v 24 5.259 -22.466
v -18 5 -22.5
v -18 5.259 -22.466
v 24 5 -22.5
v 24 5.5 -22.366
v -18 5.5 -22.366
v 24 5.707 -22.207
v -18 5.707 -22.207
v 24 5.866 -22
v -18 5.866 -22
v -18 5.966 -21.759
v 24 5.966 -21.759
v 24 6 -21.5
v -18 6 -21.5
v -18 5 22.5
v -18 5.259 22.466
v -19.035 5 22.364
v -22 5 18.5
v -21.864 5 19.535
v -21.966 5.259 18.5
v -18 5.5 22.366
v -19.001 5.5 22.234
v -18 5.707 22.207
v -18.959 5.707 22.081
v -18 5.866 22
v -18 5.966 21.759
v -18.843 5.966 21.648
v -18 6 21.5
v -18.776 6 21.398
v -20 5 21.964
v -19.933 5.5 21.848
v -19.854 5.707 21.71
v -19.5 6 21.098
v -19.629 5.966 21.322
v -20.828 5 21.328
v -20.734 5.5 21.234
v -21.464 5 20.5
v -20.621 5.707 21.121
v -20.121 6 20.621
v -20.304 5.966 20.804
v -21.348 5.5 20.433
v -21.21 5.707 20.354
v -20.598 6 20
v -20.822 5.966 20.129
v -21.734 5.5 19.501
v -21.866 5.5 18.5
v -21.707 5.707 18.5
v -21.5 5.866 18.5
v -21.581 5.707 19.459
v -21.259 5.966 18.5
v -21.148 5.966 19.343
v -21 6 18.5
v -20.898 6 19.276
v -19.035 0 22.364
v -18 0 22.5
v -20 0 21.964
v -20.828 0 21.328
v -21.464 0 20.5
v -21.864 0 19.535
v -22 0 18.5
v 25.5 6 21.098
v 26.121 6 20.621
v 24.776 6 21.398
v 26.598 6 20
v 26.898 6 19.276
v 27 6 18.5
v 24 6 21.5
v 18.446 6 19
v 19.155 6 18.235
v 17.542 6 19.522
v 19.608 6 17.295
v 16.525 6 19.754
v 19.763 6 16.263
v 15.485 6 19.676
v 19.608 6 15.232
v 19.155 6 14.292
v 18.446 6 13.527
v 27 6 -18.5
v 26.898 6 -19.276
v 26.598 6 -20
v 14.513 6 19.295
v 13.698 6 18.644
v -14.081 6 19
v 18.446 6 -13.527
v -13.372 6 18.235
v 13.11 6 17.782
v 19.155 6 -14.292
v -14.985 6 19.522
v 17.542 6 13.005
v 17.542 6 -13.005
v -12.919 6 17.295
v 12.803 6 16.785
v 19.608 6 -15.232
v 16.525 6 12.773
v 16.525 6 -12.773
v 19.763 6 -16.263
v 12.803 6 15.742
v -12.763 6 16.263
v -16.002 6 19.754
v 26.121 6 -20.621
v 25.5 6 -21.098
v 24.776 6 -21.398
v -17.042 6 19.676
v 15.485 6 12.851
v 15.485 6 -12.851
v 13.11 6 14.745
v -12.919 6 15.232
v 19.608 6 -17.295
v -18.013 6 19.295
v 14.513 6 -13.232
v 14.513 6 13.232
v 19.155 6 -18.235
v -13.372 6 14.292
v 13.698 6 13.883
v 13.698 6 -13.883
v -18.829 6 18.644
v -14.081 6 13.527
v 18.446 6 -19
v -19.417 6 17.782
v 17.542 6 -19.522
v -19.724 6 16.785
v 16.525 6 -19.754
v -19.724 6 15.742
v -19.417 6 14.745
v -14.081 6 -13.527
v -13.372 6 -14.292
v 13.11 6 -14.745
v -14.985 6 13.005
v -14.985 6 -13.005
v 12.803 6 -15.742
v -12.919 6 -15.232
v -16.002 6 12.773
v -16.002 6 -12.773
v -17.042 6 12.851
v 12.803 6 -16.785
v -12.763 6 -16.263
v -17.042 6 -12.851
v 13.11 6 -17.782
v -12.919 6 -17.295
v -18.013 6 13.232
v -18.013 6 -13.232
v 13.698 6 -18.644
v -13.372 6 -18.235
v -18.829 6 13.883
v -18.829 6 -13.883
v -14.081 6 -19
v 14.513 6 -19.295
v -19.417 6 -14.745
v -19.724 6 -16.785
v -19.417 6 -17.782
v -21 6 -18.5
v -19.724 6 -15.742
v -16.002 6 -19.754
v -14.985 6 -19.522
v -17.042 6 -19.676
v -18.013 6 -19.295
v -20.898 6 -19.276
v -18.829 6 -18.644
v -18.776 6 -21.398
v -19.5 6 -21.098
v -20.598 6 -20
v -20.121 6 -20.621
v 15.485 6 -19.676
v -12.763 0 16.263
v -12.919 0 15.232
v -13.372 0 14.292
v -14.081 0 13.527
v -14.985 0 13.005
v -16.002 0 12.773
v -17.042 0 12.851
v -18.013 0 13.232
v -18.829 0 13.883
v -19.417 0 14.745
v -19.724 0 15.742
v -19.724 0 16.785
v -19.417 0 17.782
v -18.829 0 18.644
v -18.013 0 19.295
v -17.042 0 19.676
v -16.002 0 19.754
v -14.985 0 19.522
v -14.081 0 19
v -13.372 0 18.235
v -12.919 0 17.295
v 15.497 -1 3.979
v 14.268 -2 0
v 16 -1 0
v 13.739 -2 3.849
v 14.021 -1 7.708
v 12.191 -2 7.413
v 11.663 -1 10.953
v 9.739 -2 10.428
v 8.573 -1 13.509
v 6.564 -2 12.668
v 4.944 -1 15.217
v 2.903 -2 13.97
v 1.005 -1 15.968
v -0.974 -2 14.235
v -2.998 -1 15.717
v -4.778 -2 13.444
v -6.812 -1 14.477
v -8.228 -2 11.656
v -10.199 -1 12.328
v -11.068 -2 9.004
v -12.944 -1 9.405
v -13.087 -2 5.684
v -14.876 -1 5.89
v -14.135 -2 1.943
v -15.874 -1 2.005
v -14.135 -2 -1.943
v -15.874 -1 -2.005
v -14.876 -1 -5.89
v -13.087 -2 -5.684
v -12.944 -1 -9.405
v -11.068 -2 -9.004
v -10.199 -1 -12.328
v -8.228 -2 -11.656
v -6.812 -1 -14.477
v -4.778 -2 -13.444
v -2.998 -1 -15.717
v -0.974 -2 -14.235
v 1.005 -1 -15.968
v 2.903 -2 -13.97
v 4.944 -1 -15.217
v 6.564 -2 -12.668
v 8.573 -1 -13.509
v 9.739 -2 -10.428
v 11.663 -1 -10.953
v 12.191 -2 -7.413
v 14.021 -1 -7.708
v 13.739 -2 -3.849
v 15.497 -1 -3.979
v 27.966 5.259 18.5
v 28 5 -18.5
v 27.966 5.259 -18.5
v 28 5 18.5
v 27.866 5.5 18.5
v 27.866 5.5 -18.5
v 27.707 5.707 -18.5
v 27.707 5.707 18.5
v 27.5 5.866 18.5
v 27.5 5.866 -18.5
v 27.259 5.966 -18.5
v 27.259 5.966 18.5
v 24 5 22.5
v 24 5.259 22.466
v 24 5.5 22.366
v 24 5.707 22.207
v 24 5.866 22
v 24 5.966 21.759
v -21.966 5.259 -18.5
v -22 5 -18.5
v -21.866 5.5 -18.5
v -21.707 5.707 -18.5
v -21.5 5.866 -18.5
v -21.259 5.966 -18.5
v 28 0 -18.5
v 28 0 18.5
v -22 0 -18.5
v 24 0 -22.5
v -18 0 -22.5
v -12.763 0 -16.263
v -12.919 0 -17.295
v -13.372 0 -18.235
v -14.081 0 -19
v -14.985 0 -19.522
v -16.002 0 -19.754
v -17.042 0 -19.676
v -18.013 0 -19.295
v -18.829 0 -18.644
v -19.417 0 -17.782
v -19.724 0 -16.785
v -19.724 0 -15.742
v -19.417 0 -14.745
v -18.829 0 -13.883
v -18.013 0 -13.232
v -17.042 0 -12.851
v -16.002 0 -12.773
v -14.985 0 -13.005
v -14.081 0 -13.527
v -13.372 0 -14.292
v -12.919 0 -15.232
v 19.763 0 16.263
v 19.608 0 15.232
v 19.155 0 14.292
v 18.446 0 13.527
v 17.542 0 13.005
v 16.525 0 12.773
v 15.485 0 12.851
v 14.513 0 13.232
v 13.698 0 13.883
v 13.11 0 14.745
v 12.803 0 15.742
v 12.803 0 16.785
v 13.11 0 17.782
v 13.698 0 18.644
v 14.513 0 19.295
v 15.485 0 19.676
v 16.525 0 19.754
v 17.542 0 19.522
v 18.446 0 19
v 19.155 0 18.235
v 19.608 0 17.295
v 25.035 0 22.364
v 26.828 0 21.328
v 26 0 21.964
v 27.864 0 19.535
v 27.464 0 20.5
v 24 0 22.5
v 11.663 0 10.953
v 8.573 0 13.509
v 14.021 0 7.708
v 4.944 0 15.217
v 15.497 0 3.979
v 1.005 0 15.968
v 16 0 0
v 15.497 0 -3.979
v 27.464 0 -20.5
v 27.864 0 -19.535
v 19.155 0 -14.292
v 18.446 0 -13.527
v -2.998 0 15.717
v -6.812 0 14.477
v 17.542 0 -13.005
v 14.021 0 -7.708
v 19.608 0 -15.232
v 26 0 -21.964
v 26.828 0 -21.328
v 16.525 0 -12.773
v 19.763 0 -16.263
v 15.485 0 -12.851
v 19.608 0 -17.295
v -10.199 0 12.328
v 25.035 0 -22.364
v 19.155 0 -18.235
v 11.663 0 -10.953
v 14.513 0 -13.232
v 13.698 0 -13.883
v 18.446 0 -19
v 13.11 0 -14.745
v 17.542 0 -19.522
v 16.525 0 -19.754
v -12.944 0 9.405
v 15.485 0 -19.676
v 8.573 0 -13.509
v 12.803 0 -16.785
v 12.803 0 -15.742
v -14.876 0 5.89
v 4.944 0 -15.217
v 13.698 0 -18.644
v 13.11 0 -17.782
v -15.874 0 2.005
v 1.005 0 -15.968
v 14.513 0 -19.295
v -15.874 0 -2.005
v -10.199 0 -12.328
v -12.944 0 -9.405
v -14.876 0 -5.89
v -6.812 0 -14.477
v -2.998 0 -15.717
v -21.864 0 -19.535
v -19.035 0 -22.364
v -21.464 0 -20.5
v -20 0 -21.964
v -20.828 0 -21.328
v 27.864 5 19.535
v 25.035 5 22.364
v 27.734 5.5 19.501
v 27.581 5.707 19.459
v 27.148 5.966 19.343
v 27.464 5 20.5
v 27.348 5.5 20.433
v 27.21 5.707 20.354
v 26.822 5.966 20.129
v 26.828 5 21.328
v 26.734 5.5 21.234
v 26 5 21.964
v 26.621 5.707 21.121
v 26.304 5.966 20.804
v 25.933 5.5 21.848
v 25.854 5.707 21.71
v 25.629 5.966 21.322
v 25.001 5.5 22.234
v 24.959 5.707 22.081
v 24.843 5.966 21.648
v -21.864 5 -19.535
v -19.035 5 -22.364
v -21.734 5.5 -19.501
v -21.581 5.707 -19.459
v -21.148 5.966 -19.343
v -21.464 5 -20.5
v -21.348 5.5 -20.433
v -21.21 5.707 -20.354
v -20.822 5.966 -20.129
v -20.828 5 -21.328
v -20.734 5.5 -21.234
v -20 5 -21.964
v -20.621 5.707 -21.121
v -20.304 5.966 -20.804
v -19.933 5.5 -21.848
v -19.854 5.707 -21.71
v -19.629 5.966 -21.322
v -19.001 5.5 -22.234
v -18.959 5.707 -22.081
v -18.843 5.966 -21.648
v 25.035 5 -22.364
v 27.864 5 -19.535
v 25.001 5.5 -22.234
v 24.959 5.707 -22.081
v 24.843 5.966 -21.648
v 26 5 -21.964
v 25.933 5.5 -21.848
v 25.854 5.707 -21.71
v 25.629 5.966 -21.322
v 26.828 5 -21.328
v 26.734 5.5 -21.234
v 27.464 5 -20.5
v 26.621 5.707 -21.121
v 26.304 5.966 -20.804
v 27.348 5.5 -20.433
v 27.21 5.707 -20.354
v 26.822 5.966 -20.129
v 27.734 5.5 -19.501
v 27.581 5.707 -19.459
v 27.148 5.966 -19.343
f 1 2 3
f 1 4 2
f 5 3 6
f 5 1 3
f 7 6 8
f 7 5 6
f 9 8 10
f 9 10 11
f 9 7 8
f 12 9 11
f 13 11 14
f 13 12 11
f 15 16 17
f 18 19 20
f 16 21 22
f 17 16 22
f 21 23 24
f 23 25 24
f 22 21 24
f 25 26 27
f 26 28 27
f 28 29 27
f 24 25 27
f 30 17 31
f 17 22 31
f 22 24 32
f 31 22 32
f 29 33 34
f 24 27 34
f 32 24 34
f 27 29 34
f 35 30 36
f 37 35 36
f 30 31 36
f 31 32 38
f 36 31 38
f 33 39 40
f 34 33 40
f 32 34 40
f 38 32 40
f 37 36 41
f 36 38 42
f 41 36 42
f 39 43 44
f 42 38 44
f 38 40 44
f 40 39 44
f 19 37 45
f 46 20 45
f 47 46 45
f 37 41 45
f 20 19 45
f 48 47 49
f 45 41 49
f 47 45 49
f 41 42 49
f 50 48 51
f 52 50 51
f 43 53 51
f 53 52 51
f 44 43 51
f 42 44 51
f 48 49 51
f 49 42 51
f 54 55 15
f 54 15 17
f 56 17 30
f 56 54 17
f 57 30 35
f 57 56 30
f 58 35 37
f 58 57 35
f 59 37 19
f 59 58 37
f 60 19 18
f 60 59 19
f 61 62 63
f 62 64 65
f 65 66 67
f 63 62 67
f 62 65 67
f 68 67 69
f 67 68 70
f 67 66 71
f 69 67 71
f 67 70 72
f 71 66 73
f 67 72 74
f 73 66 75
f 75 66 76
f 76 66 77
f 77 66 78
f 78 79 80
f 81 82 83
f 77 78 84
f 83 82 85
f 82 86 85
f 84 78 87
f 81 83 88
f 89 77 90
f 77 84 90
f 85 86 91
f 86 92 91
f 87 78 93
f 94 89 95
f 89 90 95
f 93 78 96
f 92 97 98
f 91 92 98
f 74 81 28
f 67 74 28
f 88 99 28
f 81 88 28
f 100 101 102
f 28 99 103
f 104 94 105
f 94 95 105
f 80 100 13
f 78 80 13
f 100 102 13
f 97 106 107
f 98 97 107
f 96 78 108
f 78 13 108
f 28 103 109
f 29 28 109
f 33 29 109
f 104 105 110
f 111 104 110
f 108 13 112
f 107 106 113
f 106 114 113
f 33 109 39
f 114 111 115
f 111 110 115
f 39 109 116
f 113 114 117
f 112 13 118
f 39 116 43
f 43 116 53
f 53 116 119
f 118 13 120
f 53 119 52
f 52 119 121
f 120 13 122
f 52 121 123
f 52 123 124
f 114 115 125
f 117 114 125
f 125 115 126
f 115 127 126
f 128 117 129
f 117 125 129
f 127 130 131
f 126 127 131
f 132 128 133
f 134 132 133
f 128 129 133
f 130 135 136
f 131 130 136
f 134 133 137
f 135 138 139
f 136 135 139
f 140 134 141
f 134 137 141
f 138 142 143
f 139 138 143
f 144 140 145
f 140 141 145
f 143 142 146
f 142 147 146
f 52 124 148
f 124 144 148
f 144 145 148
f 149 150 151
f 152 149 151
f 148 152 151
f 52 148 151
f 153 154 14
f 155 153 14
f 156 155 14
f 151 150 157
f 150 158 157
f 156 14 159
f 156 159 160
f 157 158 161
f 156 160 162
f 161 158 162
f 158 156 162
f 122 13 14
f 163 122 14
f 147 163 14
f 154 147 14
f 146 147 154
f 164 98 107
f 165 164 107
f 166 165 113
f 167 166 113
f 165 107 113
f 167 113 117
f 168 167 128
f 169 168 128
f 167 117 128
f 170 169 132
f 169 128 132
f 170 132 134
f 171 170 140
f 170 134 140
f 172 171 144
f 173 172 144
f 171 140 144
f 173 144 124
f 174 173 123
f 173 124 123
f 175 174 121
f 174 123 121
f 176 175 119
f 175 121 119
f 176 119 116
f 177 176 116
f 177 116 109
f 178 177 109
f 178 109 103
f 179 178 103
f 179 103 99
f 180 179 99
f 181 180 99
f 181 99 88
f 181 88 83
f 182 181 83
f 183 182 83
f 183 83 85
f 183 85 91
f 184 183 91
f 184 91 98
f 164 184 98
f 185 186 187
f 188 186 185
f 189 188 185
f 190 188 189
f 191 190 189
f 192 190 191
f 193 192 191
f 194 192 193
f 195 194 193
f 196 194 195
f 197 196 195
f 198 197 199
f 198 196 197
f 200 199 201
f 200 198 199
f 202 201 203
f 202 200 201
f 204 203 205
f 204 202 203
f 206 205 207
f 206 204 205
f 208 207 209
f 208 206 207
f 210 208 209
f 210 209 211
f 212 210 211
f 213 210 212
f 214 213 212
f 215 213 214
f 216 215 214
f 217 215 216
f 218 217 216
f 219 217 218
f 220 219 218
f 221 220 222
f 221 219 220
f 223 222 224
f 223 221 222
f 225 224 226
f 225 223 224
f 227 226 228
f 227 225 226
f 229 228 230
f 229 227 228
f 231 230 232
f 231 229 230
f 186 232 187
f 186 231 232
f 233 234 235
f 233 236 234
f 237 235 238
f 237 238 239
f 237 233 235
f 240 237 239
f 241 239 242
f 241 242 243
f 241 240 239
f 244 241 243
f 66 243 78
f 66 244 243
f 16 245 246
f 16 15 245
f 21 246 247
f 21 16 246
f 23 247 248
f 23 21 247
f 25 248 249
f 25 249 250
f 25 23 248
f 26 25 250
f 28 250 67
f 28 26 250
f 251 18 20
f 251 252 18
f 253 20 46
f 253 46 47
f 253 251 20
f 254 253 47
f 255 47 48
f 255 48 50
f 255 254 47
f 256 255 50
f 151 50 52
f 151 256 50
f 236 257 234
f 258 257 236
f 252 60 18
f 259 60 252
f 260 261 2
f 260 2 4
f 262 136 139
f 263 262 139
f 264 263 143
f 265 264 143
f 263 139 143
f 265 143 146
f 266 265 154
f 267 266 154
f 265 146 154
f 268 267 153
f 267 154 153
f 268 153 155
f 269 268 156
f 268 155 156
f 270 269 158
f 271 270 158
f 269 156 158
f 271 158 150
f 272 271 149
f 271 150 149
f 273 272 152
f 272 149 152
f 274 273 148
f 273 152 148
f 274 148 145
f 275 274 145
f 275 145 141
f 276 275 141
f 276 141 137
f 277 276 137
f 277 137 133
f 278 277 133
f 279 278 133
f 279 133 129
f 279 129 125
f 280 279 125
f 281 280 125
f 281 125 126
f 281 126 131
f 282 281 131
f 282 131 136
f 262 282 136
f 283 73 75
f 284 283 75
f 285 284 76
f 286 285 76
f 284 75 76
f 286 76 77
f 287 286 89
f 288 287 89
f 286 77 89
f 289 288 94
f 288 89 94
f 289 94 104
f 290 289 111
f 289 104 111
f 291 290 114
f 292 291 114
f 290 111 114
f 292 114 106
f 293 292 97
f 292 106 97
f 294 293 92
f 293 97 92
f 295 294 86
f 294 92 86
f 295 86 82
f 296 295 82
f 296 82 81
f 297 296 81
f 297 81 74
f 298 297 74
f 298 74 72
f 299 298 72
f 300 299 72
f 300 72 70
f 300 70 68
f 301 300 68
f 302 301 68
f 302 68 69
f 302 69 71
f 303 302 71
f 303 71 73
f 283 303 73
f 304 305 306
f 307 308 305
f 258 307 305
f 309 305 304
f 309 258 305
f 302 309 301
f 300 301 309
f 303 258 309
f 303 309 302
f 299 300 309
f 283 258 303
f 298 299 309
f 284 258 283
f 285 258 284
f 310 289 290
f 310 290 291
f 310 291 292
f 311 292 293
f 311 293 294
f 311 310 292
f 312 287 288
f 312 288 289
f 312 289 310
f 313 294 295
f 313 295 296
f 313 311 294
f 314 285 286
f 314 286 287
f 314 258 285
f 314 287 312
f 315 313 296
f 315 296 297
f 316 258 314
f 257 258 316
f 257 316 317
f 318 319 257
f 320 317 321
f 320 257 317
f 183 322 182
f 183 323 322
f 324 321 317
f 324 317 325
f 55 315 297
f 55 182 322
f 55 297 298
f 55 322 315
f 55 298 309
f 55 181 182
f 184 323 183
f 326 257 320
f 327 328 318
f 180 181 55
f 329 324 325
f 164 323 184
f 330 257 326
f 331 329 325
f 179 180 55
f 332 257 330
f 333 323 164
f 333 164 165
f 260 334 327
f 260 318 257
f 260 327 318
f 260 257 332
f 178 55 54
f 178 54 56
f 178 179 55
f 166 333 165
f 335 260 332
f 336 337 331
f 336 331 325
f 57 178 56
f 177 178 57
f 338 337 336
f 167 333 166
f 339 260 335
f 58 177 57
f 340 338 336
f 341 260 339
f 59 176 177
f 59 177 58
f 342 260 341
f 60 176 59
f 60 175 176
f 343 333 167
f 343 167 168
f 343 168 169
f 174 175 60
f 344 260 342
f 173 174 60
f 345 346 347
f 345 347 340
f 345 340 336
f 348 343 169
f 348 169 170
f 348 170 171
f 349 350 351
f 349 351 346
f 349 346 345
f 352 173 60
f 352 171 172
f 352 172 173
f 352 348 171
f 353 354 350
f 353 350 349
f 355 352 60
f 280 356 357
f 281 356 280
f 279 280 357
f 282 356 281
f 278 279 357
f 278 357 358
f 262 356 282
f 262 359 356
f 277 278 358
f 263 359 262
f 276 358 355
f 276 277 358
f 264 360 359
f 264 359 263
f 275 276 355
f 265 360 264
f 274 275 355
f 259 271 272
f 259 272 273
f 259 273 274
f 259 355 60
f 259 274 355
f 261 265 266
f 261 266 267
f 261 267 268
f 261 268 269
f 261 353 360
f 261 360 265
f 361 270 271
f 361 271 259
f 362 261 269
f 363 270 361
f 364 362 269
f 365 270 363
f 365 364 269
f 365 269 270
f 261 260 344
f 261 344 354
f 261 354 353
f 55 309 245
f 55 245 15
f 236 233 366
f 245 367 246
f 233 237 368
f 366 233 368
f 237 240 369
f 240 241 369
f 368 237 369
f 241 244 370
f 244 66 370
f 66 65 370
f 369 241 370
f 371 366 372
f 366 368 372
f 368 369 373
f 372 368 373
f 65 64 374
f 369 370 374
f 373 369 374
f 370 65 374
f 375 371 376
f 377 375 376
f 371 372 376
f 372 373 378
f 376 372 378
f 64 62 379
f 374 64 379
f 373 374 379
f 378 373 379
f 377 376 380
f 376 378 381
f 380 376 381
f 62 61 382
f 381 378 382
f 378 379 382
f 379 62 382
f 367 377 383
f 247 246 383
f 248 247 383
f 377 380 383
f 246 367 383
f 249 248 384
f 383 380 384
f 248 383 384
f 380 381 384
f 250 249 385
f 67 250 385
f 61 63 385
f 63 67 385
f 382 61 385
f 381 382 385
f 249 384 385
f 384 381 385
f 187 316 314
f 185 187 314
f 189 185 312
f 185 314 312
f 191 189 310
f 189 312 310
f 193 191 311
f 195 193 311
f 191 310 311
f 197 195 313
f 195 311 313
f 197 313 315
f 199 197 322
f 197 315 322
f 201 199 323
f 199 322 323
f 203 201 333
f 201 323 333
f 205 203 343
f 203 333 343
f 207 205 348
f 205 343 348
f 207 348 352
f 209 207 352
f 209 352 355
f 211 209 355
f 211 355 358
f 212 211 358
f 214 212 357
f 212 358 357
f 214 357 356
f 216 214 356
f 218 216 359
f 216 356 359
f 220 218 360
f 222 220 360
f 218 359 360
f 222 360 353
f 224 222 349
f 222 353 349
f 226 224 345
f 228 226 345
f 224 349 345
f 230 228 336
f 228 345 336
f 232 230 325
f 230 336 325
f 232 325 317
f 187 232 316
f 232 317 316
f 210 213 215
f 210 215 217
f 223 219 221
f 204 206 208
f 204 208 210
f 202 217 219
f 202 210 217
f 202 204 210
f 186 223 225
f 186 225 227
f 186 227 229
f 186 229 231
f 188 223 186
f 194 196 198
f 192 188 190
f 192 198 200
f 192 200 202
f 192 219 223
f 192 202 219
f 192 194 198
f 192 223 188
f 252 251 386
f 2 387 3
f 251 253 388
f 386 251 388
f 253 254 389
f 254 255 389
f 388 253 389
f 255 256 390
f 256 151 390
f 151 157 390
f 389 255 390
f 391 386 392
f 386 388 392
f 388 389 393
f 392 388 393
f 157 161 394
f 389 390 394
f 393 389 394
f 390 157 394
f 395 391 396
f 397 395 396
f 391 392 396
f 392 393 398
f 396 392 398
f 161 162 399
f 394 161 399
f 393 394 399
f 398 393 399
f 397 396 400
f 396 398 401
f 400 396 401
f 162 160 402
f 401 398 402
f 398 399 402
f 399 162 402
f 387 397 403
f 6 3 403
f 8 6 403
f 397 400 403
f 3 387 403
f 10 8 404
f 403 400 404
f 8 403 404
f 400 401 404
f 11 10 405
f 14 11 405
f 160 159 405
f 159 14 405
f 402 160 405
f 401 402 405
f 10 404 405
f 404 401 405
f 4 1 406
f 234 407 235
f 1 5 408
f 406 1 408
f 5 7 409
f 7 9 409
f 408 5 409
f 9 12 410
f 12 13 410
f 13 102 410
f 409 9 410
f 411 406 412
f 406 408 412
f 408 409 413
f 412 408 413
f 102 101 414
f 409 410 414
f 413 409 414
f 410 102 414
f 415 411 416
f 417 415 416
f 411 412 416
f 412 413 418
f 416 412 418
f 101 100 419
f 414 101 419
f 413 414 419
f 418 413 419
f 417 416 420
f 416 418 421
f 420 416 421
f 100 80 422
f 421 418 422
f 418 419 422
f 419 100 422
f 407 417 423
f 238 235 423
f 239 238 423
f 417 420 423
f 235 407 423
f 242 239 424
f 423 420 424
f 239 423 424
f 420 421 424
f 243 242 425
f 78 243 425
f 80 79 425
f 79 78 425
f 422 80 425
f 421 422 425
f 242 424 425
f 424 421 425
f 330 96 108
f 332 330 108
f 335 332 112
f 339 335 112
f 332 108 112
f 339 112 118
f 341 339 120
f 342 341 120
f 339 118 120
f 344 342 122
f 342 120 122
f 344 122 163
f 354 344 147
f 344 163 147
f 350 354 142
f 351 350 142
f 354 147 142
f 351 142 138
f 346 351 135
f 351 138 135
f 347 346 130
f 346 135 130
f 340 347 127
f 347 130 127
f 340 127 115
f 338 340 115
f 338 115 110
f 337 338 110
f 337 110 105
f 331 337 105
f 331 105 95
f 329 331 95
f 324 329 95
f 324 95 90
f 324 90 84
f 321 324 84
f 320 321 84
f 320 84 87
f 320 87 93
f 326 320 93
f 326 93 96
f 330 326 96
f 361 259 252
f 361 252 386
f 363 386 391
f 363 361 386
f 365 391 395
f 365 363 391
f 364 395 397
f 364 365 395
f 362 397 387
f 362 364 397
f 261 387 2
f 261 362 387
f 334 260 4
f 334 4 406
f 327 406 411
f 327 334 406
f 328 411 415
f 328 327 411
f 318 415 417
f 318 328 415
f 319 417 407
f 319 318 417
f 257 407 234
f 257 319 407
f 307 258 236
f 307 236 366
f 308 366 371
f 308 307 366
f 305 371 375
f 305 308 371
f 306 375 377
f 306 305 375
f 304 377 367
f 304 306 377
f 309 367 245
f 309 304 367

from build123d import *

# Parameters (mm, degrees)
BOSS_EXTRUDE1_DEPTH = 6
FILLET1_R           = 1
SKETCH2_R           = 16
BOSS_EXTRUDE2_DEPTH = 2
CHAMFER1_SIZE       = 1
CHAMFER1_SIZE2      = 1.732050808
SKETCH3_R           = 3.5
CUT_EXTRUDE1_DEPTH  = 9


with BuildPart() as part:
    # Sketch1 → Boss-Extrude1 (new body)
    with BuildSketch(Plane(origin=(0, 0, 0), x_dir=(1, 0, 0), z_dir=(0, 1, 0))):
        with BuildLine():
            Line((-18, 22.5), (24, 22.5))
            ThreePointArc((24, 22.5), (26.828427125, 21.328427125), (28, 18.5))
            Line((28, 18.5), (28, -18.5))
            ThreePointArc((28, -18.5), (26.828427125, -21.328427125), (24, -22.5))
            Line((24, -22.5), (-18, -22.5))
            ThreePointArc((-18, -22.5), (-20.828427125, -21.328427125), (-22, -18.5))
            Line((-22, -18.5), (-22, 18.5))
            ThreePointArc((-22, 18.5), (-20.828427125, 21.328427125), (-18, 22.5))
        make_face()
    extrude(amount=BOSS_EXTRUDE1_DEPTH)

    # Fillet1
    fillet1_edges = [part.edges().sort_by_distance(p)[0] for p in [
        (-20.828427125, 6, -21.328427125),
        (-22, 6, 0),
        (-20.828427125, 6, 21.328427125),
        (3, 6, 22.5),
        (26.828427125, 6, 21.328427125),
        (28, 6, 0),
        (26.828427125, 6, -21.328427125),
        (3, 6, -22.5),
    ]]
    fillet(fillet1_edges, radius=FILLET1_R)

    # Sketch2 → Boss-Extrude2 (add)
    with BuildSketch(Plane.XZ):
        Circle(SKETCH2_R)
    extrude(amount=BOSS_EXTRUDE2_DEPTH)

    # Chamfer1
    chamfer1_edges = [part.edges().sort_by_distance(p)[0] for p in [
        (-16, -2, 0),
    ]]
    chamfer1_side = [part.faces().sort_by_distance(p)[0] for p in [
        (-16, -1, 0),
    ]]
    chamfer(chamfer1_edges, length=CHAMFER1_SIZE, length2=CHAMFER1_SIZE2, reference=chamfer1_side[0])

    # Sketch3 → Cut-Extrude1 (cut, through all)
    with BuildSketch(Plane(origin=(0, 6, 0), x_dir=(1, 0, 0), z_dir=(0, 1, 0))):
        with Locations((-16.263455967, 16.263455967)):
            Circle(SKETCH3_R)
        with Locations((16.263455967, 16.263455967)):
            Circle(SKETCH3_R)
        with Locations((16.263455967, -16.263455967)):
            Circle(SKETCH3_R)
        with Locations((-16.263455967, -16.263455967)):
            Circle(SKETCH3_R)
    extrude(amount=-CUT_EXTRUDE1_DEPTH, mode=Mode.SUBTRACT)


solid = part.part
